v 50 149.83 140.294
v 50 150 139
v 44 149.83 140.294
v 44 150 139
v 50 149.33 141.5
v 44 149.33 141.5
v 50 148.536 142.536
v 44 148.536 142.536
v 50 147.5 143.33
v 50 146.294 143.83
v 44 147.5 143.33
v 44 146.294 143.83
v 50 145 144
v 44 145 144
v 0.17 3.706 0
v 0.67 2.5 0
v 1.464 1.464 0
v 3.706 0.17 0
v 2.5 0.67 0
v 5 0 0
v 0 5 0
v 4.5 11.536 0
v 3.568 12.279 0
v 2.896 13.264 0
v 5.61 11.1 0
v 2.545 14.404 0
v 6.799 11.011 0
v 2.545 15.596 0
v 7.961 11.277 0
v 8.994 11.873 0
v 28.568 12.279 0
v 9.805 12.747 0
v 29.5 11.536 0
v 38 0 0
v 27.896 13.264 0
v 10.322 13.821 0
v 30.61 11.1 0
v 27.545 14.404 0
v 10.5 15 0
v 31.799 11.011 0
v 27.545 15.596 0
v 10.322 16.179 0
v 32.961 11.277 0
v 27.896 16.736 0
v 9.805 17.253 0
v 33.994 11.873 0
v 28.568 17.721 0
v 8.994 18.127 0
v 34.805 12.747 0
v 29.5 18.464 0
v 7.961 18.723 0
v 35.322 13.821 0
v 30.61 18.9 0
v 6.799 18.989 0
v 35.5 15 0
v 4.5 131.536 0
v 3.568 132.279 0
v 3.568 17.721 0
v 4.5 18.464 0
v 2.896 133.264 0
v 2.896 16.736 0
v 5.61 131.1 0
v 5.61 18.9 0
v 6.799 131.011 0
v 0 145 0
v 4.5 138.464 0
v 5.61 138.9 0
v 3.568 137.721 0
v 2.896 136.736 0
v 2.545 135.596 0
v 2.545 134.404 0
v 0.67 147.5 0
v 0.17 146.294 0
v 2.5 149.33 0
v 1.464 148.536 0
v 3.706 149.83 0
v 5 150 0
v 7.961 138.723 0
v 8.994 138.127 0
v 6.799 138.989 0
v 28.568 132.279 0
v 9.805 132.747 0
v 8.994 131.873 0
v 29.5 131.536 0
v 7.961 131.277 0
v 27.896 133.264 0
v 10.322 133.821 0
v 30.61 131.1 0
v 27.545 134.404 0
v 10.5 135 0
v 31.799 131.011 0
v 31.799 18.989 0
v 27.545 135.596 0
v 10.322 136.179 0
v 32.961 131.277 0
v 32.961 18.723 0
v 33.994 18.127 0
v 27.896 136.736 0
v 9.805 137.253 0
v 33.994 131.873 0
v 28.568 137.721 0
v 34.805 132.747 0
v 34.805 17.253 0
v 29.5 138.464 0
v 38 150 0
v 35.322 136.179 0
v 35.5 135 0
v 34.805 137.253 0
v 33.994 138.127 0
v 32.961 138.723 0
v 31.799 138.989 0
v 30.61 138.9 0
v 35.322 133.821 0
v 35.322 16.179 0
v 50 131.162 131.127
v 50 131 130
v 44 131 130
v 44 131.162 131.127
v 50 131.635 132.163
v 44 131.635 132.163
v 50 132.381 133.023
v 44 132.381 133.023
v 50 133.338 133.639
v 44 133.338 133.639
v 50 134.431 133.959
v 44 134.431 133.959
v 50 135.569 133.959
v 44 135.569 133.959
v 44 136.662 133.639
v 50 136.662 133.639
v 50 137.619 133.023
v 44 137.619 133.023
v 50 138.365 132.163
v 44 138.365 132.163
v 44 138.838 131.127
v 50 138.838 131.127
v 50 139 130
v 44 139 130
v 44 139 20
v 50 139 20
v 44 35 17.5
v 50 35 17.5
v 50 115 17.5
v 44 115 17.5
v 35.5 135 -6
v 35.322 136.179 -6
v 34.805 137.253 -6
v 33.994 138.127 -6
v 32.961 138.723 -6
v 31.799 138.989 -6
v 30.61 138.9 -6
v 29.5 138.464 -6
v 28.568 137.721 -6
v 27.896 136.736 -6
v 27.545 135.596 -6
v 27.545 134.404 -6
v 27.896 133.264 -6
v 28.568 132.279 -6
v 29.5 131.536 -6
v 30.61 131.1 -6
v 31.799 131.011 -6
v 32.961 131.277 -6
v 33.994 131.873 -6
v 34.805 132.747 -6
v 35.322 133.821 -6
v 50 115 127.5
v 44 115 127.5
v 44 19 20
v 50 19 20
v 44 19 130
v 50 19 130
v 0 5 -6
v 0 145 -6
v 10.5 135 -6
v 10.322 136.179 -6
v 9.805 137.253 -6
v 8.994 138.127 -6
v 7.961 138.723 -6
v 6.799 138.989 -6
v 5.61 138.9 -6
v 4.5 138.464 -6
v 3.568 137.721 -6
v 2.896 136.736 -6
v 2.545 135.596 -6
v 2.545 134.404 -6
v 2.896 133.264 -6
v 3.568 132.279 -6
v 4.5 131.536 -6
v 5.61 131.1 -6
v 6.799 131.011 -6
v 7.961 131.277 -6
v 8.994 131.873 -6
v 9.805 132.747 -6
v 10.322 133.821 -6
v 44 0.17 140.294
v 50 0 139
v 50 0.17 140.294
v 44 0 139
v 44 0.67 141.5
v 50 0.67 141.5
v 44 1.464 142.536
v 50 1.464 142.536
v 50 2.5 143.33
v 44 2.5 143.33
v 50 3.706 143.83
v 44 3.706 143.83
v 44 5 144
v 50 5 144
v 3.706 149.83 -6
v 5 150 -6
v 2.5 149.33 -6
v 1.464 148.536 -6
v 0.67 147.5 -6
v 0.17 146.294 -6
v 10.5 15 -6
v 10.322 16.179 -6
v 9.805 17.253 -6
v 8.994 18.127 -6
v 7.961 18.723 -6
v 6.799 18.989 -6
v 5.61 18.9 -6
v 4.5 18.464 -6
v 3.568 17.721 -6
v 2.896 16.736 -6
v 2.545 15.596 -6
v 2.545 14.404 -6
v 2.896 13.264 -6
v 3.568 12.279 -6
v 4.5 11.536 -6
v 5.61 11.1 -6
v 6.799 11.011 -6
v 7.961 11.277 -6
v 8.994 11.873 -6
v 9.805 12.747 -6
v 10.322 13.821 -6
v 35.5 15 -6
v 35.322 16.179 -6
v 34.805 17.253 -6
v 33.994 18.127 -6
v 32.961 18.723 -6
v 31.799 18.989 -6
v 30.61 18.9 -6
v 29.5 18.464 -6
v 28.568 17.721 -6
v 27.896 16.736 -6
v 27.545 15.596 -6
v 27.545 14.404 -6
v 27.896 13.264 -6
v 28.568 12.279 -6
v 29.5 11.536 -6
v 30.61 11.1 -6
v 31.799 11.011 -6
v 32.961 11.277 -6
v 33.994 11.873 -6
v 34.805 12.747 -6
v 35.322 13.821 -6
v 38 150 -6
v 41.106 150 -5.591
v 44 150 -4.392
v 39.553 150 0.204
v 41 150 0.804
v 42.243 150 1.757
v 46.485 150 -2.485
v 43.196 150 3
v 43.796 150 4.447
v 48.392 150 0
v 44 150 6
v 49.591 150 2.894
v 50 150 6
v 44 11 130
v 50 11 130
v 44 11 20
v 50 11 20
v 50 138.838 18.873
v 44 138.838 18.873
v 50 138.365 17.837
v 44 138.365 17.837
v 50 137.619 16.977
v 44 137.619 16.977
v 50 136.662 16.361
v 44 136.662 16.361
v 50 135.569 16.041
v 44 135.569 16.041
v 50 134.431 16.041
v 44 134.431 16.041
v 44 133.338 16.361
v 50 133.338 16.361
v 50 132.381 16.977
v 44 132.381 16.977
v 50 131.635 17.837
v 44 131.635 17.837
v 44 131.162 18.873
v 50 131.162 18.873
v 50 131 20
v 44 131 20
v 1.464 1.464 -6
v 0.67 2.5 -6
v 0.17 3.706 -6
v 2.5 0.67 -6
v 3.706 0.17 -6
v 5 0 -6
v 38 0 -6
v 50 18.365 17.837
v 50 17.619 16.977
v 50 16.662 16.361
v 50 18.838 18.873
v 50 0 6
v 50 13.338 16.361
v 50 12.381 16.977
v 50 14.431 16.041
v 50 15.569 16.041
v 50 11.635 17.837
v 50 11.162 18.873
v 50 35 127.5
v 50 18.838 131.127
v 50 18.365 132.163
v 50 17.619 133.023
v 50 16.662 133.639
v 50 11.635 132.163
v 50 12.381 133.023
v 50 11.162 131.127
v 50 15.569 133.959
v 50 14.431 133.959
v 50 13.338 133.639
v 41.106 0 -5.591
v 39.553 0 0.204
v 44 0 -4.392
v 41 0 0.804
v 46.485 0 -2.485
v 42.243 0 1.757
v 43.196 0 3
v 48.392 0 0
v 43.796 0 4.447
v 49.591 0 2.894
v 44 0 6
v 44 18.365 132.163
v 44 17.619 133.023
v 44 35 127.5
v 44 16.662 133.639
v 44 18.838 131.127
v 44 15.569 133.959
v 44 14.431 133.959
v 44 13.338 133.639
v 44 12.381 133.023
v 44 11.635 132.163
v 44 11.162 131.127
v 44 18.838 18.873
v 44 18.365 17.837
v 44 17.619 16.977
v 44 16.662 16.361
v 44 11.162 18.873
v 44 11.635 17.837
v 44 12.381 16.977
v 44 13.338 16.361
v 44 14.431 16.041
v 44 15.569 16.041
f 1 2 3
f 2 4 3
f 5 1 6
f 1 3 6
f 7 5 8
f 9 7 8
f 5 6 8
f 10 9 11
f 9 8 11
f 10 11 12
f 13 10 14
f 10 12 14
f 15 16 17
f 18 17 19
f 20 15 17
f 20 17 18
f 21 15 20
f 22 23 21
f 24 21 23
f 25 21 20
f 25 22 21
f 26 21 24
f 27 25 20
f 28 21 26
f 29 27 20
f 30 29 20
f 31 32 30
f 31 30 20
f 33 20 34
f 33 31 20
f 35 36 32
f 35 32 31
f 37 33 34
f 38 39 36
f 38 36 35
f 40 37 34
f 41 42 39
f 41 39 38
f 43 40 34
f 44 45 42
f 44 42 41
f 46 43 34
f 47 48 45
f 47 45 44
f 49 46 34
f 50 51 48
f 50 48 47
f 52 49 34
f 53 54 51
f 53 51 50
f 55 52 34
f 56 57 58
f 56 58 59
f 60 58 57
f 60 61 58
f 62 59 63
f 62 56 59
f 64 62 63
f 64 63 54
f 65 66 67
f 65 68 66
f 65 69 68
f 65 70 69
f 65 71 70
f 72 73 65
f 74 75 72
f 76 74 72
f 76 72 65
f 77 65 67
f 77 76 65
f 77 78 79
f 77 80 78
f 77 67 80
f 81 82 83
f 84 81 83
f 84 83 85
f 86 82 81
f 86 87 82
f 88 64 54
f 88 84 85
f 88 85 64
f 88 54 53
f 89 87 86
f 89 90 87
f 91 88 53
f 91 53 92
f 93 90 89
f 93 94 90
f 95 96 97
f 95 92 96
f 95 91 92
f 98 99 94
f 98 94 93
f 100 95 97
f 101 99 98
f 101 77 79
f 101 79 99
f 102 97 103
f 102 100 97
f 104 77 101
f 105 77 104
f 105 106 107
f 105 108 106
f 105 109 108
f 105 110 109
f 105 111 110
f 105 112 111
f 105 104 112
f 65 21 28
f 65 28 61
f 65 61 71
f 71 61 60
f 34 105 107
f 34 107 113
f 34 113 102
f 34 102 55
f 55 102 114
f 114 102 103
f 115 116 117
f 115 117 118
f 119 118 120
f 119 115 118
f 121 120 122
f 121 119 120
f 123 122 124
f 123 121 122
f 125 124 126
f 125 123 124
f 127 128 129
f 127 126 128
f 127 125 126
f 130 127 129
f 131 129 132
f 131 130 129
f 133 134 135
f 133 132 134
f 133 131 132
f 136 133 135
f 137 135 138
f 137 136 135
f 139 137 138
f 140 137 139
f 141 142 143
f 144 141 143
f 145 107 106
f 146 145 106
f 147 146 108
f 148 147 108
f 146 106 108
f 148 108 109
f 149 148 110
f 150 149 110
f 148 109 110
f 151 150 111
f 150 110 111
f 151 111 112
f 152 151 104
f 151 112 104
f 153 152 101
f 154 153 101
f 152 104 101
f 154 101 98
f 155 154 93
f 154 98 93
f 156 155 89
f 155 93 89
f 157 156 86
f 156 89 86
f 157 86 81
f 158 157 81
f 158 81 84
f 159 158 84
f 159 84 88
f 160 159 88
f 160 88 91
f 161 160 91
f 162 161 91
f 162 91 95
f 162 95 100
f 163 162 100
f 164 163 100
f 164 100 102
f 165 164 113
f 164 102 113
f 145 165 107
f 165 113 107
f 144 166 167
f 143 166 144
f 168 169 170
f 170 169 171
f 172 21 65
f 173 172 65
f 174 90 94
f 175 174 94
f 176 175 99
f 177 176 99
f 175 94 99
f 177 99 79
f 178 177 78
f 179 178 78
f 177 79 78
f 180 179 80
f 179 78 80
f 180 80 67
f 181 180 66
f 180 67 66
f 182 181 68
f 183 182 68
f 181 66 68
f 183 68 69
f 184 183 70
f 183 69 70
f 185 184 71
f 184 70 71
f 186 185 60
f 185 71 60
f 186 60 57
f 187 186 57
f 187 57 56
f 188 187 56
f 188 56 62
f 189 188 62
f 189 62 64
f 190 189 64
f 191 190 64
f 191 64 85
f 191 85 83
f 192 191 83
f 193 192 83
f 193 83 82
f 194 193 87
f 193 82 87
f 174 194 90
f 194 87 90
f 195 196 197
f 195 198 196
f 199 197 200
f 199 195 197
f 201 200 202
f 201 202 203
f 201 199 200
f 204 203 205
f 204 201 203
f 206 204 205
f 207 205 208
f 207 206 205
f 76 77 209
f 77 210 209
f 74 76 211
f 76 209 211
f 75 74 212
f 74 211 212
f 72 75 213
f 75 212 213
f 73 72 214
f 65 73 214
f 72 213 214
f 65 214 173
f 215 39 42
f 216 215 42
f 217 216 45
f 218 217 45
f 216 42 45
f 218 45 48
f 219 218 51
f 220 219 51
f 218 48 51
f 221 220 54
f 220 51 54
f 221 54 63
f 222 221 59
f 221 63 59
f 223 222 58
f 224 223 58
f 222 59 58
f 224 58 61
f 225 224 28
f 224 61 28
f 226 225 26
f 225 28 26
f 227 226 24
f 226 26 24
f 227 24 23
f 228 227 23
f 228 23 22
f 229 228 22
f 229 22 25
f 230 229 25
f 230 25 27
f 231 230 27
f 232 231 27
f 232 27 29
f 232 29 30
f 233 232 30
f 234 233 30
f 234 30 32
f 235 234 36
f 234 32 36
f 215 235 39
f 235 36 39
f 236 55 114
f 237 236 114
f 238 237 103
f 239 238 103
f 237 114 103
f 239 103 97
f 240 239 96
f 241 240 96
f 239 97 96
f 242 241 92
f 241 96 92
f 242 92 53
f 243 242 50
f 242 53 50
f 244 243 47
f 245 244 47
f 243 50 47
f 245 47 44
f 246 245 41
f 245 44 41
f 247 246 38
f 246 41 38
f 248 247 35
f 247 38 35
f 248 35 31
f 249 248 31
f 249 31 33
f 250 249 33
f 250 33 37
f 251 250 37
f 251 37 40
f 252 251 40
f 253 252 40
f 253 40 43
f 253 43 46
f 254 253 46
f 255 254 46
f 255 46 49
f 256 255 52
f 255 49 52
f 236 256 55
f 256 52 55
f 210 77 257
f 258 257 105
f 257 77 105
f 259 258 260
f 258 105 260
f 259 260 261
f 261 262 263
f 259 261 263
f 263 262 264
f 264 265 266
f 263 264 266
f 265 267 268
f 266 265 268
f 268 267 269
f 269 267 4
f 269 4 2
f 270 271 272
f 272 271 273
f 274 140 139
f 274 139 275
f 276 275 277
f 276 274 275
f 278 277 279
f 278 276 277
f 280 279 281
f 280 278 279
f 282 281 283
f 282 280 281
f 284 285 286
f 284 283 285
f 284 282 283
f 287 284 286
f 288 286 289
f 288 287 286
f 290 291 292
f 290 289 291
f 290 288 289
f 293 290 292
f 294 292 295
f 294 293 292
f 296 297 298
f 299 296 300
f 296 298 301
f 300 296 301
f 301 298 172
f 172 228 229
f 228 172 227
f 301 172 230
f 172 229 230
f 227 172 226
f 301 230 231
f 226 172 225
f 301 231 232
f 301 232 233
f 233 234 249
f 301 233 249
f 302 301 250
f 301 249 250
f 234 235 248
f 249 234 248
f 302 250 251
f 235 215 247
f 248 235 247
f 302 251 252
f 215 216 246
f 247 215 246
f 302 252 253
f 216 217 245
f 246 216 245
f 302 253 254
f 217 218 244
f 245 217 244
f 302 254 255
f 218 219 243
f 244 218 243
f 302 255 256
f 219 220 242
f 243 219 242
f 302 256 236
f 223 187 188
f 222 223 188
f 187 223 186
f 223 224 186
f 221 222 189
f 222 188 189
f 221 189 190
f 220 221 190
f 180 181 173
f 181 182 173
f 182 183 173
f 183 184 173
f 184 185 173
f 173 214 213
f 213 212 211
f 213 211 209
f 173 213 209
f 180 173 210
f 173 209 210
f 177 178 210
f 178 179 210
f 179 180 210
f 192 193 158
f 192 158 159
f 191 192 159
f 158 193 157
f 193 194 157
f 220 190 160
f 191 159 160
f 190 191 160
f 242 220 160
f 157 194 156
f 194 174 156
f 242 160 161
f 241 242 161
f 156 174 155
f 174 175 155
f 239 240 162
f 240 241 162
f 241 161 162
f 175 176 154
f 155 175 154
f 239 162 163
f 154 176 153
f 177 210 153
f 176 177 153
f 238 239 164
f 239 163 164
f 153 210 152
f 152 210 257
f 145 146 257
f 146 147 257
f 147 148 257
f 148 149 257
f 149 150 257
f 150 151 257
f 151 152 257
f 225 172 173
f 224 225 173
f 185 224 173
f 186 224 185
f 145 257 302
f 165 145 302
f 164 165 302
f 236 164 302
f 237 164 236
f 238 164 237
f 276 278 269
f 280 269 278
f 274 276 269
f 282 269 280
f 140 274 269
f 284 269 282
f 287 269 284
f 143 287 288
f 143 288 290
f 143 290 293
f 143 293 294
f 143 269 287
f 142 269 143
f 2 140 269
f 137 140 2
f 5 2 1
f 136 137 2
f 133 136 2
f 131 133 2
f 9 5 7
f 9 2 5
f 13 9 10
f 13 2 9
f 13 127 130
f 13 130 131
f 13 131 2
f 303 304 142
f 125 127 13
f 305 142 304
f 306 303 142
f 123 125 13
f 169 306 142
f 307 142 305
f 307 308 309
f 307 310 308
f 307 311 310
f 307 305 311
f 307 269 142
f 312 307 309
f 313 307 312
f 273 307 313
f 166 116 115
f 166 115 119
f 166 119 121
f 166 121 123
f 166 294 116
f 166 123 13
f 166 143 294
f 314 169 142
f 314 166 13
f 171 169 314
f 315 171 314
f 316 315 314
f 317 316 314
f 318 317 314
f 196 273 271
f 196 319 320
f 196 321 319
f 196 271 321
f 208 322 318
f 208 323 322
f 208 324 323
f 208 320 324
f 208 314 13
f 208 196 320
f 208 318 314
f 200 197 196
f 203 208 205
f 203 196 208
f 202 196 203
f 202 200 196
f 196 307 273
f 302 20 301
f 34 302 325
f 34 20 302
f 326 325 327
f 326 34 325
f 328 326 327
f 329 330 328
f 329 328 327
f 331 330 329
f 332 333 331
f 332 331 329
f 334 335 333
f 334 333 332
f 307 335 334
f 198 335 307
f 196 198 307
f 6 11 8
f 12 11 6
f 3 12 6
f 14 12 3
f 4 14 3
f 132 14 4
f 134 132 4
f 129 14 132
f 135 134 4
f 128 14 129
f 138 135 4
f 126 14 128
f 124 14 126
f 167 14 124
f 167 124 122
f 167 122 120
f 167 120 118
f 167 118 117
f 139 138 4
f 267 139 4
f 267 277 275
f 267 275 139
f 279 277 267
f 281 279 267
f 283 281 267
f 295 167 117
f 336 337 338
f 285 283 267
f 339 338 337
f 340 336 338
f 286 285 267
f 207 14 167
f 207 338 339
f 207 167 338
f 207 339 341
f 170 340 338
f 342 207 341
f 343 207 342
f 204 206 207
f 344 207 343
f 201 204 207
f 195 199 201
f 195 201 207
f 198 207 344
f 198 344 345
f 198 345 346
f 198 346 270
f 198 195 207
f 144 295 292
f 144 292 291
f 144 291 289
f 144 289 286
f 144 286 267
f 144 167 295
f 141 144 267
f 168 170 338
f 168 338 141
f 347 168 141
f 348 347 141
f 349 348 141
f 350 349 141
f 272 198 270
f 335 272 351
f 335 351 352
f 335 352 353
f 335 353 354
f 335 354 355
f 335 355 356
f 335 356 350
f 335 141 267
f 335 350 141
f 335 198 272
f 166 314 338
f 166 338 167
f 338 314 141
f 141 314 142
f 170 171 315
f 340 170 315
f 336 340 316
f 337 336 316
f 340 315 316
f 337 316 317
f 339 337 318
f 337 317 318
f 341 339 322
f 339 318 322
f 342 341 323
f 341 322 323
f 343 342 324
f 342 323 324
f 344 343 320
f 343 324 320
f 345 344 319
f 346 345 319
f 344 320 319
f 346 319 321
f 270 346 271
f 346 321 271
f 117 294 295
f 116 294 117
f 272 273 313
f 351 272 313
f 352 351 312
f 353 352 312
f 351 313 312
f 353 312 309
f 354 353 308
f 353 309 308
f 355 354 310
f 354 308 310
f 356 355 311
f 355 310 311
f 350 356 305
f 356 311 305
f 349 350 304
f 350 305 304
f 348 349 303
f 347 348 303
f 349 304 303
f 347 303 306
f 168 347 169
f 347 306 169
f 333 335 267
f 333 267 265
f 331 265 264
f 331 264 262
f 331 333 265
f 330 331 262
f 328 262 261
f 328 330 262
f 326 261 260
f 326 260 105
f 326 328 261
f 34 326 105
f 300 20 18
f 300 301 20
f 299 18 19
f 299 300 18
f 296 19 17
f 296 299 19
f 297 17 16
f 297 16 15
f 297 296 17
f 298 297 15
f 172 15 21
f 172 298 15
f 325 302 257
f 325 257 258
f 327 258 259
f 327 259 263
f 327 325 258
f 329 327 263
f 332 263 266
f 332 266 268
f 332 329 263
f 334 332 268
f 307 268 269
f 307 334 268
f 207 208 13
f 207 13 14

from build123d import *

# Parameters (mm, degrees)
SKETCH1_W                    = 50
SKETCH1_H                    = 150
BASE_FLANGE1_DEPTH           = 6
EDGE_FLANGE1_STRIP_W         = 36
EDGE_FLANGE1_STRIP_H         = 6
EDGE_FLANGE1_STRIP_CUT_DEPTH = 150
EDGE_FLANGE1_DEPTH           = 150
SKETCH9_R                    = 4
CUT_EXTRUDE1_DEPTH           = 6
CUT_EXTRUDE2_DEPTH           = 10
FILLET1_R                    = 5
SKETCH11_W                   = 20
SKETCH11_H                   = 80
SKETCH11_W_2                 = 70
SKETCH11_R                   = 4
SKETCH11_R_2                 = 20
CUT_EXTRUDE5_DEPTH           = 10


# Sheet-metal steps are written as plain solids
with BuildPart() as part:
    # Sketch1 → Base-Flange1 (new body)
    with BuildSketch(Plane.XY):
        with Locations((25, 75)):
            Rectangle(SKETCH1_W, SKETCH1_H)
    extrude(amount=-BASE_FLANGE1_DEPTH)

    # Edge-Flange1 strip (across the edge) → Edge-Flange1 strip cut (cut)
    with BuildSketch(Plane(origin=(50, 0, 0), x_dir=(-1, 0, 0), z_dir=(0, 1, 0))):
        with Locations((-6, -3)):
            Rectangle(EDGE_FLANGE1_STRIP_W, EDGE_FLANGE1_STRIP_H)
    extrude(amount=EDGE_FLANGE1_STRIP_CUT_DEPTH, mode=Mode.SUBTRACT)

    # Edge-Flange1 section (across the edge) → Edge-Flange1 (add)
    with BuildSketch(Plane(origin=(50, 0, 0), x_dir=(-1, 0, 0), z_dir=(0, 1, 0))):
        with BuildLine():
            Line((0, 6), (0, 144))
            Line((0, 144), (6, 144))
            Line((6, 144), (6, 6))
            ThreePointArc((6, 6), (7.757359313, 1.757359313), (12, 0))
            Line((12, 0), (12, -6))
            ThreePointArc((12, -6), (3.514718626, -2.485281374), (0, 6))
        make_face()
    extrude(amount=EDGE_FLANGE1_DEPTH)

    # Sketch9 → Cut-Extrude1 (cut)
    with BuildSketch(Plane.XY):
        with Locations((6.5, 135)):
            Circle(SKETCH9_R)
        with Locations((31.5, 135)):
            Circle(SKETCH9_R)
        with Locations((6.5, 15)):
            Circle(SKETCH9_R)
        with Locations((31.5, 15)):
            Circle(SKETCH9_R)
    extrude(amount=-CUT_EXTRUDE1_DEPTH, mode=Mode.SUBTRACT)

    # Sketch10 → Cut-Extrude2 (cut)
    with BuildSketch(Plane(origin=(50, 0, 0), x_dir=(0, 0, -1), z_dir=(1, 0, 0))):
        with BuildLine():
            Line((-130, 139), (-20, 139))
            ThreePointArc((-20, 139), (-16, 135), (-20, 131))
            Line((-20, 131), (-130, 131))
            ThreePointArc((-130, 131), (-134, 135), (-130, 139))
        make_face()
        with BuildLine():
            Line((-130, 11), (-20, 11))
            ThreePointArc((-20, 11), (-16, 15), (-20, 19))
            Line((-20, 19), (-130, 19))
            ThreePointArc((-130, 19), (-134, 15), (-130, 11))
        make_face()
    extrude(amount=-CUT_EXTRUDE2_DEPTH, mode=Mode.SUBTRACT)

    # Fillet1
    fillet1_edges = [part.edges().sort_by_distance(p)[0] for p in [
        (47, 0, 144),
        (47, 150, 144),
        (0, 0, -3),
        (0, 150, -3),
    ]]
    fillet(fillet1_edges, radius=FILLET1_R)

    # Sketch11 → Cut-Extrude5 (cut)
    # profile 1 of 6: a face of its own
    with BuildSketch(Plane(origin=(50, 0, 0), x_dir=(0, 0, -1), z_dir=(1, 0, 0))):
        with Locations((-117.5, 75)):
            Rectangle(SKETCH11_W, SKETCH11_H)
    # profile 2 of 6: a face of its own
    with BuildSketch(Plane(origin=(50, 0, 0), x_dir=(0, 0, -1), z_dir=(1, 0, 0))):
        with Locations((-27.5, 75)):
            Rectangle(SKETCH11_W, SKETCH11_H)
    # profile 3 of 6: a face of its own
    with BuildSketch(Plane(origin=(50, 0, 0), x_dir=(0, 0, -1), z_dir=(1, 0, 0))):
        with Locations((-72.5, 75)):
            Rectangle(SKETCH11_W_2, SKETCH11_H)
        with Locations((-97.5, 50)):
            Circle(SKETCH11_R, mode=Mode.SUBTRACT)
        with Locations((-47.5, 50)):
            Circle(SKETCH11_R, mode=Mode.SUBTRACT)
        with Locations((-72.5, 75)):
            Circle(SKETCH11_R_2, mode=Mode.SUBTRACT)
        with Locations((-97.5, 100)):
            Circle(SKETCH11_R, mode=Mode.SUBTRACT)
        with Locations((-47.5, 100)):
            Circle(SKETCH11_R, mode=Mode.SUBTRACT)
    # profile 4 of 6: a face of its own
    with BuildSketch(Plane(origin=(50, 0, 0), x_dir=(0, 0, -1), z_dir=(1, 0, 0))):
        with Locations((-72.5, 75)):
            Circle(SKETCH11_R_2)
    # profile 5 of 6: a face of its own
    with BuildSketch(Plane(origin=(50, 0, 0), x_dir=(0, 0, -1), z_dir=(1, 0, 0))):
        with Locations((-47.5, 50)):
            Circle(SKETCH11_R)
    # profile 6 of 6: a face of its own
    with BuildSketch(Plane(origin=(50, 0, 0), x_dir=(0, 0, -1), z_dir=(1, 0, 0))):
        with Locations((-47.5, 100)):
            Circle(SKETCH11_R)
    extrude(amount=-CUT_EXTRUDE5_DEPTH, mode=Mode.SUBTRACT)


with BuildPart() as cut_extrude5_kept_piece:
    # of the separate pieces the step leaves, the one the design keeps (cut_extrude5_pieces_kept)
    add(part.part.solids().sort_by_distance((0, 5, 0))[0])


solid = cut_extrude5_kept_piece.part
